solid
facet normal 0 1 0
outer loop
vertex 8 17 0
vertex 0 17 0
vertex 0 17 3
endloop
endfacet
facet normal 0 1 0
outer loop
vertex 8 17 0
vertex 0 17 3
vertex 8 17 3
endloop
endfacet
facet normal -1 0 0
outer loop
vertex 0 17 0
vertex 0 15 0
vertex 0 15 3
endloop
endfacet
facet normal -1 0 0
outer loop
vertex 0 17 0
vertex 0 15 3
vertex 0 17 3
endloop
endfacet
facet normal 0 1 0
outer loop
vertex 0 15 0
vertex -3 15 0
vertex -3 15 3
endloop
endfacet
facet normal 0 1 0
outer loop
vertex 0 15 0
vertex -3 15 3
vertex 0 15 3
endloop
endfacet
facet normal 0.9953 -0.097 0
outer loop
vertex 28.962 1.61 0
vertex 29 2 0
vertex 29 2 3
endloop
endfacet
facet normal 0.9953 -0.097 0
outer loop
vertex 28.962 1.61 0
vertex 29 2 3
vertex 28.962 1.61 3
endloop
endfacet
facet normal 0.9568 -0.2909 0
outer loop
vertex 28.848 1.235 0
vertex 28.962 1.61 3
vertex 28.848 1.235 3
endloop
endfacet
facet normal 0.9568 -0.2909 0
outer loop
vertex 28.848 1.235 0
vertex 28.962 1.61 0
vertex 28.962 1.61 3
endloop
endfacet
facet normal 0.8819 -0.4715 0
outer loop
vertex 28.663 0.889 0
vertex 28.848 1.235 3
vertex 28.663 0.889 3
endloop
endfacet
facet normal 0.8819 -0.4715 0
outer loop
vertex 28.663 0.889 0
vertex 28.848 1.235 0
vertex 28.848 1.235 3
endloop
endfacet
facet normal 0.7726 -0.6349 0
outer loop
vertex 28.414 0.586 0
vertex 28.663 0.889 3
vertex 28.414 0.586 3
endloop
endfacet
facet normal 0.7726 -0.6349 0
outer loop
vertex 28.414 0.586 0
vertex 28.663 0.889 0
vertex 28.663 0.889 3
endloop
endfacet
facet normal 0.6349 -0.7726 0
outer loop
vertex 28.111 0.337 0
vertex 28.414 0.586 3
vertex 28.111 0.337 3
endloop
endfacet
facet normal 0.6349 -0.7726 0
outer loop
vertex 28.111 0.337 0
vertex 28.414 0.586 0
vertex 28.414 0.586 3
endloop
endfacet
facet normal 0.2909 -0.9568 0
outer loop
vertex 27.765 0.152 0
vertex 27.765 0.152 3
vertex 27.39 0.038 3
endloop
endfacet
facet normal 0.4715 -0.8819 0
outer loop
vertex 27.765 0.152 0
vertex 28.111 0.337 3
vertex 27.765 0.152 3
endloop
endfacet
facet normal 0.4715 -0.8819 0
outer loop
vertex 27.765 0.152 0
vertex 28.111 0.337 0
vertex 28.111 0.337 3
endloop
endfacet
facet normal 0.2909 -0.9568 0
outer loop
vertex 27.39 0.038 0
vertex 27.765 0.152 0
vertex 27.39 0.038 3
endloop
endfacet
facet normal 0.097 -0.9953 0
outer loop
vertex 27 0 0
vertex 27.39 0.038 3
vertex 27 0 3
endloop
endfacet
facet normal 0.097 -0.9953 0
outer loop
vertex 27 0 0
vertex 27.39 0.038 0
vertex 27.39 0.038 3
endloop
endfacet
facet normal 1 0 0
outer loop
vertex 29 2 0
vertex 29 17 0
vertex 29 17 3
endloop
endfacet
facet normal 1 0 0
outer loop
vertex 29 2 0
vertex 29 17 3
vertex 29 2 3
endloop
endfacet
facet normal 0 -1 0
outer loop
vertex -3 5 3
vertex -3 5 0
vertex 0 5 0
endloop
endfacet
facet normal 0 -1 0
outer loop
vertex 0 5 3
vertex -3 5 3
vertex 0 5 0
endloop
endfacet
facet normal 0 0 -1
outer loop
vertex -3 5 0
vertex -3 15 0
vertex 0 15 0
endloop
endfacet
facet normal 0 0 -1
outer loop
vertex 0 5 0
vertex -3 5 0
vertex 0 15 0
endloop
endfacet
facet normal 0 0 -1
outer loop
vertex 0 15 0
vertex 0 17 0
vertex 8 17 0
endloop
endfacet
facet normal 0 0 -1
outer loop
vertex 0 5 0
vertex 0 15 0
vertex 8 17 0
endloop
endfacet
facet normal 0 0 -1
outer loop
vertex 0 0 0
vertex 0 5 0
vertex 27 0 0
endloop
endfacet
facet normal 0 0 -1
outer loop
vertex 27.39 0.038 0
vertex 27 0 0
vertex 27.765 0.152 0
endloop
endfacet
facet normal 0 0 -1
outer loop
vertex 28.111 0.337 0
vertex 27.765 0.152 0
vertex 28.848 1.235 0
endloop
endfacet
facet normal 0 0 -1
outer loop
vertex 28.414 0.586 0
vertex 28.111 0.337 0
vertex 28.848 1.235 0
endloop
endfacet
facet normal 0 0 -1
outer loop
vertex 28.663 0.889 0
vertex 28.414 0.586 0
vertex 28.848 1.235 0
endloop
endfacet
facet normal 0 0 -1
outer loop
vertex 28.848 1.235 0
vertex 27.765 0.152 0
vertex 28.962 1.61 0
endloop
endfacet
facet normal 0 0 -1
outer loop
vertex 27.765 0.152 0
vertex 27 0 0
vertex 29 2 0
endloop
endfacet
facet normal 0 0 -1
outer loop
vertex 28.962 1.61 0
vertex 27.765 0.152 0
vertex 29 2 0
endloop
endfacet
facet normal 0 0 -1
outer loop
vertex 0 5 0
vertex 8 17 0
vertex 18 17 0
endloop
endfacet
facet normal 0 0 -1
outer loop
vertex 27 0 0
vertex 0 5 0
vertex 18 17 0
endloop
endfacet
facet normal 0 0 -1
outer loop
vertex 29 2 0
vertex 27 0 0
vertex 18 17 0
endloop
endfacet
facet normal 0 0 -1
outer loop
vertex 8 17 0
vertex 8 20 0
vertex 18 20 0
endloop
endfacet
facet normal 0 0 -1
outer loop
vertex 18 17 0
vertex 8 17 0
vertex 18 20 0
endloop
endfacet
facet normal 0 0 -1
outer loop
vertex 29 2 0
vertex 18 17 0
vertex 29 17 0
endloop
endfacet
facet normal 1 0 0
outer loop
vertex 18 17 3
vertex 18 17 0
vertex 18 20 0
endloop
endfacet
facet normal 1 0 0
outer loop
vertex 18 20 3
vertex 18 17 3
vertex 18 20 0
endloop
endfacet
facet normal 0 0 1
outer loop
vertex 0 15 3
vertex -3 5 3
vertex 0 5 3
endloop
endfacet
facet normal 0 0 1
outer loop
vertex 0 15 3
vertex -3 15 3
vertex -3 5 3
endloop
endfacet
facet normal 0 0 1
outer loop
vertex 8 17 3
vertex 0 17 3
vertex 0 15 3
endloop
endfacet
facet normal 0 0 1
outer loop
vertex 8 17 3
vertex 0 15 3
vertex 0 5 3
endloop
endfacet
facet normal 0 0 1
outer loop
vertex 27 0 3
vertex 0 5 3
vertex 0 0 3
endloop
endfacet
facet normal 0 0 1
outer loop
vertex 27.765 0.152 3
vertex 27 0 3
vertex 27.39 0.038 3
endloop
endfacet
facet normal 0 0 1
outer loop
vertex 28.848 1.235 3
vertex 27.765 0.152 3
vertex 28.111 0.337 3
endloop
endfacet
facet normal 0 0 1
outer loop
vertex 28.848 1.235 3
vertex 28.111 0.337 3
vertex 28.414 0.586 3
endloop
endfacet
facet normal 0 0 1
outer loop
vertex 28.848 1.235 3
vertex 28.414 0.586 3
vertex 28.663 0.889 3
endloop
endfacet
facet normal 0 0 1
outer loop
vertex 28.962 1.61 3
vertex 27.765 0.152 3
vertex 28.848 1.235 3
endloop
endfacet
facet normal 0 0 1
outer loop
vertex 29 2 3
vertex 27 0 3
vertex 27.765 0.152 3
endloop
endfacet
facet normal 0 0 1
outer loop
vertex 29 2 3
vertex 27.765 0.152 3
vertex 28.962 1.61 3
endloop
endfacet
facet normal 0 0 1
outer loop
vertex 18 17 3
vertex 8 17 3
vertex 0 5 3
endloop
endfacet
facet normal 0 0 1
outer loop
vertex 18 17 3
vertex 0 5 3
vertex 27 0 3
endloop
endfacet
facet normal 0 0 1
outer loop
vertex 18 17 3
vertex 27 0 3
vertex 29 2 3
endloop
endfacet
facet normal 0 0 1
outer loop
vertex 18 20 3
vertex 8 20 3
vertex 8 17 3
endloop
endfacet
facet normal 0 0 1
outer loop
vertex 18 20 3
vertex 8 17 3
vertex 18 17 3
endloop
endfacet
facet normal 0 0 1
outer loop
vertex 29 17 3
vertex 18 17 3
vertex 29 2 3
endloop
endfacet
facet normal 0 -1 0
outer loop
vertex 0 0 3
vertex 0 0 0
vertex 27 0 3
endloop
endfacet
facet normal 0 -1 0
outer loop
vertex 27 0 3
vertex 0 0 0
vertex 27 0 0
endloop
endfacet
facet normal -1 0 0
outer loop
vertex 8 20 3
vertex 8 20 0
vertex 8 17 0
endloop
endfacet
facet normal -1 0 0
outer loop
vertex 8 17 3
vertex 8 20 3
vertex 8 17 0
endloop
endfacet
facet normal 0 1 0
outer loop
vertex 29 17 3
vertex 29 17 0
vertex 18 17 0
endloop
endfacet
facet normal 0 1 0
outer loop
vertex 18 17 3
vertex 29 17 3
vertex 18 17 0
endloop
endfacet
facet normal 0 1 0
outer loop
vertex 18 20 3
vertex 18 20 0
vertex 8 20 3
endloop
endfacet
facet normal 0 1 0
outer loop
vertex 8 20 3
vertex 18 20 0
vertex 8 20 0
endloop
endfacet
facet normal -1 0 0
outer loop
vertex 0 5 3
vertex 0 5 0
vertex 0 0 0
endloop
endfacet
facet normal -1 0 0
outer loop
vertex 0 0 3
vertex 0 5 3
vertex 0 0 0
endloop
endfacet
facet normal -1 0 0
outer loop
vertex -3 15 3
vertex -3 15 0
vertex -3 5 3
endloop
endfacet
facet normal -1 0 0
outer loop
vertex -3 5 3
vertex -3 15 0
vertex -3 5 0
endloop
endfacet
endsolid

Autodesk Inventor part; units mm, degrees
ref_plane "YZ Plane" through (0, 0, 0) normal (1, 0, 0) x (0, 1, 0)
ref_plane "XZ Plane" through (0, 0, 0) normal (0, 1, 0) x (-1, 0, 0)
ref_plane "XY Plane" through (0, 0, 0) normal (0, 0, 1) x (1, 0, 0)
sketch "Sketch1" plane through (0, 0, 0) normal (0, 0, 1) x (1, 0, 0)
  line L0 (0, 0) -> (27, 0)
  line L1 (18, 17) -> (18, 20)
  line L2 (18, 20) -> (8, 20)
  line L3 (8, 20) -> (8, 17)
  line L4 (29, 17) -> (18, 17)
  line L5 (-3, 15) -> (-3, 5)
  line L6 (-3, 5) -> (0, 5)
  line L7 (0, 5) -> (0, 0)
  arc A0 (27, 0) -> (29, 2) centre (27, 2) ccw
  line L8 (-3, 15) -> (0, 15)
  line L9 (29, 17) -> (29, 2)
  line L10 (0, 15) -> (0, 17)
  line L11 (0, 17) -> (8, 17)
  point P0 (25, 0)
  dimension "d8" = 10
  dimension "d10" = 3
  dimension "d15" = 2
  dimension "d16" = 10
  dimension "d25" = 3
  dimension "d26" = 5
  dimension "d33" = 17
  dimension "d35" = 11
  dimension "d36" = 11
  dimension "d38" = 2
  dimension "d39" = 8
  dimension "d40" = 32
  dimension "d41" = 3
extrude "Extrusion1" add sketch "Sketch1" along normal blind 3
properties part number "OpenROV 2.3 Dev EChassis Horz Blinder"
